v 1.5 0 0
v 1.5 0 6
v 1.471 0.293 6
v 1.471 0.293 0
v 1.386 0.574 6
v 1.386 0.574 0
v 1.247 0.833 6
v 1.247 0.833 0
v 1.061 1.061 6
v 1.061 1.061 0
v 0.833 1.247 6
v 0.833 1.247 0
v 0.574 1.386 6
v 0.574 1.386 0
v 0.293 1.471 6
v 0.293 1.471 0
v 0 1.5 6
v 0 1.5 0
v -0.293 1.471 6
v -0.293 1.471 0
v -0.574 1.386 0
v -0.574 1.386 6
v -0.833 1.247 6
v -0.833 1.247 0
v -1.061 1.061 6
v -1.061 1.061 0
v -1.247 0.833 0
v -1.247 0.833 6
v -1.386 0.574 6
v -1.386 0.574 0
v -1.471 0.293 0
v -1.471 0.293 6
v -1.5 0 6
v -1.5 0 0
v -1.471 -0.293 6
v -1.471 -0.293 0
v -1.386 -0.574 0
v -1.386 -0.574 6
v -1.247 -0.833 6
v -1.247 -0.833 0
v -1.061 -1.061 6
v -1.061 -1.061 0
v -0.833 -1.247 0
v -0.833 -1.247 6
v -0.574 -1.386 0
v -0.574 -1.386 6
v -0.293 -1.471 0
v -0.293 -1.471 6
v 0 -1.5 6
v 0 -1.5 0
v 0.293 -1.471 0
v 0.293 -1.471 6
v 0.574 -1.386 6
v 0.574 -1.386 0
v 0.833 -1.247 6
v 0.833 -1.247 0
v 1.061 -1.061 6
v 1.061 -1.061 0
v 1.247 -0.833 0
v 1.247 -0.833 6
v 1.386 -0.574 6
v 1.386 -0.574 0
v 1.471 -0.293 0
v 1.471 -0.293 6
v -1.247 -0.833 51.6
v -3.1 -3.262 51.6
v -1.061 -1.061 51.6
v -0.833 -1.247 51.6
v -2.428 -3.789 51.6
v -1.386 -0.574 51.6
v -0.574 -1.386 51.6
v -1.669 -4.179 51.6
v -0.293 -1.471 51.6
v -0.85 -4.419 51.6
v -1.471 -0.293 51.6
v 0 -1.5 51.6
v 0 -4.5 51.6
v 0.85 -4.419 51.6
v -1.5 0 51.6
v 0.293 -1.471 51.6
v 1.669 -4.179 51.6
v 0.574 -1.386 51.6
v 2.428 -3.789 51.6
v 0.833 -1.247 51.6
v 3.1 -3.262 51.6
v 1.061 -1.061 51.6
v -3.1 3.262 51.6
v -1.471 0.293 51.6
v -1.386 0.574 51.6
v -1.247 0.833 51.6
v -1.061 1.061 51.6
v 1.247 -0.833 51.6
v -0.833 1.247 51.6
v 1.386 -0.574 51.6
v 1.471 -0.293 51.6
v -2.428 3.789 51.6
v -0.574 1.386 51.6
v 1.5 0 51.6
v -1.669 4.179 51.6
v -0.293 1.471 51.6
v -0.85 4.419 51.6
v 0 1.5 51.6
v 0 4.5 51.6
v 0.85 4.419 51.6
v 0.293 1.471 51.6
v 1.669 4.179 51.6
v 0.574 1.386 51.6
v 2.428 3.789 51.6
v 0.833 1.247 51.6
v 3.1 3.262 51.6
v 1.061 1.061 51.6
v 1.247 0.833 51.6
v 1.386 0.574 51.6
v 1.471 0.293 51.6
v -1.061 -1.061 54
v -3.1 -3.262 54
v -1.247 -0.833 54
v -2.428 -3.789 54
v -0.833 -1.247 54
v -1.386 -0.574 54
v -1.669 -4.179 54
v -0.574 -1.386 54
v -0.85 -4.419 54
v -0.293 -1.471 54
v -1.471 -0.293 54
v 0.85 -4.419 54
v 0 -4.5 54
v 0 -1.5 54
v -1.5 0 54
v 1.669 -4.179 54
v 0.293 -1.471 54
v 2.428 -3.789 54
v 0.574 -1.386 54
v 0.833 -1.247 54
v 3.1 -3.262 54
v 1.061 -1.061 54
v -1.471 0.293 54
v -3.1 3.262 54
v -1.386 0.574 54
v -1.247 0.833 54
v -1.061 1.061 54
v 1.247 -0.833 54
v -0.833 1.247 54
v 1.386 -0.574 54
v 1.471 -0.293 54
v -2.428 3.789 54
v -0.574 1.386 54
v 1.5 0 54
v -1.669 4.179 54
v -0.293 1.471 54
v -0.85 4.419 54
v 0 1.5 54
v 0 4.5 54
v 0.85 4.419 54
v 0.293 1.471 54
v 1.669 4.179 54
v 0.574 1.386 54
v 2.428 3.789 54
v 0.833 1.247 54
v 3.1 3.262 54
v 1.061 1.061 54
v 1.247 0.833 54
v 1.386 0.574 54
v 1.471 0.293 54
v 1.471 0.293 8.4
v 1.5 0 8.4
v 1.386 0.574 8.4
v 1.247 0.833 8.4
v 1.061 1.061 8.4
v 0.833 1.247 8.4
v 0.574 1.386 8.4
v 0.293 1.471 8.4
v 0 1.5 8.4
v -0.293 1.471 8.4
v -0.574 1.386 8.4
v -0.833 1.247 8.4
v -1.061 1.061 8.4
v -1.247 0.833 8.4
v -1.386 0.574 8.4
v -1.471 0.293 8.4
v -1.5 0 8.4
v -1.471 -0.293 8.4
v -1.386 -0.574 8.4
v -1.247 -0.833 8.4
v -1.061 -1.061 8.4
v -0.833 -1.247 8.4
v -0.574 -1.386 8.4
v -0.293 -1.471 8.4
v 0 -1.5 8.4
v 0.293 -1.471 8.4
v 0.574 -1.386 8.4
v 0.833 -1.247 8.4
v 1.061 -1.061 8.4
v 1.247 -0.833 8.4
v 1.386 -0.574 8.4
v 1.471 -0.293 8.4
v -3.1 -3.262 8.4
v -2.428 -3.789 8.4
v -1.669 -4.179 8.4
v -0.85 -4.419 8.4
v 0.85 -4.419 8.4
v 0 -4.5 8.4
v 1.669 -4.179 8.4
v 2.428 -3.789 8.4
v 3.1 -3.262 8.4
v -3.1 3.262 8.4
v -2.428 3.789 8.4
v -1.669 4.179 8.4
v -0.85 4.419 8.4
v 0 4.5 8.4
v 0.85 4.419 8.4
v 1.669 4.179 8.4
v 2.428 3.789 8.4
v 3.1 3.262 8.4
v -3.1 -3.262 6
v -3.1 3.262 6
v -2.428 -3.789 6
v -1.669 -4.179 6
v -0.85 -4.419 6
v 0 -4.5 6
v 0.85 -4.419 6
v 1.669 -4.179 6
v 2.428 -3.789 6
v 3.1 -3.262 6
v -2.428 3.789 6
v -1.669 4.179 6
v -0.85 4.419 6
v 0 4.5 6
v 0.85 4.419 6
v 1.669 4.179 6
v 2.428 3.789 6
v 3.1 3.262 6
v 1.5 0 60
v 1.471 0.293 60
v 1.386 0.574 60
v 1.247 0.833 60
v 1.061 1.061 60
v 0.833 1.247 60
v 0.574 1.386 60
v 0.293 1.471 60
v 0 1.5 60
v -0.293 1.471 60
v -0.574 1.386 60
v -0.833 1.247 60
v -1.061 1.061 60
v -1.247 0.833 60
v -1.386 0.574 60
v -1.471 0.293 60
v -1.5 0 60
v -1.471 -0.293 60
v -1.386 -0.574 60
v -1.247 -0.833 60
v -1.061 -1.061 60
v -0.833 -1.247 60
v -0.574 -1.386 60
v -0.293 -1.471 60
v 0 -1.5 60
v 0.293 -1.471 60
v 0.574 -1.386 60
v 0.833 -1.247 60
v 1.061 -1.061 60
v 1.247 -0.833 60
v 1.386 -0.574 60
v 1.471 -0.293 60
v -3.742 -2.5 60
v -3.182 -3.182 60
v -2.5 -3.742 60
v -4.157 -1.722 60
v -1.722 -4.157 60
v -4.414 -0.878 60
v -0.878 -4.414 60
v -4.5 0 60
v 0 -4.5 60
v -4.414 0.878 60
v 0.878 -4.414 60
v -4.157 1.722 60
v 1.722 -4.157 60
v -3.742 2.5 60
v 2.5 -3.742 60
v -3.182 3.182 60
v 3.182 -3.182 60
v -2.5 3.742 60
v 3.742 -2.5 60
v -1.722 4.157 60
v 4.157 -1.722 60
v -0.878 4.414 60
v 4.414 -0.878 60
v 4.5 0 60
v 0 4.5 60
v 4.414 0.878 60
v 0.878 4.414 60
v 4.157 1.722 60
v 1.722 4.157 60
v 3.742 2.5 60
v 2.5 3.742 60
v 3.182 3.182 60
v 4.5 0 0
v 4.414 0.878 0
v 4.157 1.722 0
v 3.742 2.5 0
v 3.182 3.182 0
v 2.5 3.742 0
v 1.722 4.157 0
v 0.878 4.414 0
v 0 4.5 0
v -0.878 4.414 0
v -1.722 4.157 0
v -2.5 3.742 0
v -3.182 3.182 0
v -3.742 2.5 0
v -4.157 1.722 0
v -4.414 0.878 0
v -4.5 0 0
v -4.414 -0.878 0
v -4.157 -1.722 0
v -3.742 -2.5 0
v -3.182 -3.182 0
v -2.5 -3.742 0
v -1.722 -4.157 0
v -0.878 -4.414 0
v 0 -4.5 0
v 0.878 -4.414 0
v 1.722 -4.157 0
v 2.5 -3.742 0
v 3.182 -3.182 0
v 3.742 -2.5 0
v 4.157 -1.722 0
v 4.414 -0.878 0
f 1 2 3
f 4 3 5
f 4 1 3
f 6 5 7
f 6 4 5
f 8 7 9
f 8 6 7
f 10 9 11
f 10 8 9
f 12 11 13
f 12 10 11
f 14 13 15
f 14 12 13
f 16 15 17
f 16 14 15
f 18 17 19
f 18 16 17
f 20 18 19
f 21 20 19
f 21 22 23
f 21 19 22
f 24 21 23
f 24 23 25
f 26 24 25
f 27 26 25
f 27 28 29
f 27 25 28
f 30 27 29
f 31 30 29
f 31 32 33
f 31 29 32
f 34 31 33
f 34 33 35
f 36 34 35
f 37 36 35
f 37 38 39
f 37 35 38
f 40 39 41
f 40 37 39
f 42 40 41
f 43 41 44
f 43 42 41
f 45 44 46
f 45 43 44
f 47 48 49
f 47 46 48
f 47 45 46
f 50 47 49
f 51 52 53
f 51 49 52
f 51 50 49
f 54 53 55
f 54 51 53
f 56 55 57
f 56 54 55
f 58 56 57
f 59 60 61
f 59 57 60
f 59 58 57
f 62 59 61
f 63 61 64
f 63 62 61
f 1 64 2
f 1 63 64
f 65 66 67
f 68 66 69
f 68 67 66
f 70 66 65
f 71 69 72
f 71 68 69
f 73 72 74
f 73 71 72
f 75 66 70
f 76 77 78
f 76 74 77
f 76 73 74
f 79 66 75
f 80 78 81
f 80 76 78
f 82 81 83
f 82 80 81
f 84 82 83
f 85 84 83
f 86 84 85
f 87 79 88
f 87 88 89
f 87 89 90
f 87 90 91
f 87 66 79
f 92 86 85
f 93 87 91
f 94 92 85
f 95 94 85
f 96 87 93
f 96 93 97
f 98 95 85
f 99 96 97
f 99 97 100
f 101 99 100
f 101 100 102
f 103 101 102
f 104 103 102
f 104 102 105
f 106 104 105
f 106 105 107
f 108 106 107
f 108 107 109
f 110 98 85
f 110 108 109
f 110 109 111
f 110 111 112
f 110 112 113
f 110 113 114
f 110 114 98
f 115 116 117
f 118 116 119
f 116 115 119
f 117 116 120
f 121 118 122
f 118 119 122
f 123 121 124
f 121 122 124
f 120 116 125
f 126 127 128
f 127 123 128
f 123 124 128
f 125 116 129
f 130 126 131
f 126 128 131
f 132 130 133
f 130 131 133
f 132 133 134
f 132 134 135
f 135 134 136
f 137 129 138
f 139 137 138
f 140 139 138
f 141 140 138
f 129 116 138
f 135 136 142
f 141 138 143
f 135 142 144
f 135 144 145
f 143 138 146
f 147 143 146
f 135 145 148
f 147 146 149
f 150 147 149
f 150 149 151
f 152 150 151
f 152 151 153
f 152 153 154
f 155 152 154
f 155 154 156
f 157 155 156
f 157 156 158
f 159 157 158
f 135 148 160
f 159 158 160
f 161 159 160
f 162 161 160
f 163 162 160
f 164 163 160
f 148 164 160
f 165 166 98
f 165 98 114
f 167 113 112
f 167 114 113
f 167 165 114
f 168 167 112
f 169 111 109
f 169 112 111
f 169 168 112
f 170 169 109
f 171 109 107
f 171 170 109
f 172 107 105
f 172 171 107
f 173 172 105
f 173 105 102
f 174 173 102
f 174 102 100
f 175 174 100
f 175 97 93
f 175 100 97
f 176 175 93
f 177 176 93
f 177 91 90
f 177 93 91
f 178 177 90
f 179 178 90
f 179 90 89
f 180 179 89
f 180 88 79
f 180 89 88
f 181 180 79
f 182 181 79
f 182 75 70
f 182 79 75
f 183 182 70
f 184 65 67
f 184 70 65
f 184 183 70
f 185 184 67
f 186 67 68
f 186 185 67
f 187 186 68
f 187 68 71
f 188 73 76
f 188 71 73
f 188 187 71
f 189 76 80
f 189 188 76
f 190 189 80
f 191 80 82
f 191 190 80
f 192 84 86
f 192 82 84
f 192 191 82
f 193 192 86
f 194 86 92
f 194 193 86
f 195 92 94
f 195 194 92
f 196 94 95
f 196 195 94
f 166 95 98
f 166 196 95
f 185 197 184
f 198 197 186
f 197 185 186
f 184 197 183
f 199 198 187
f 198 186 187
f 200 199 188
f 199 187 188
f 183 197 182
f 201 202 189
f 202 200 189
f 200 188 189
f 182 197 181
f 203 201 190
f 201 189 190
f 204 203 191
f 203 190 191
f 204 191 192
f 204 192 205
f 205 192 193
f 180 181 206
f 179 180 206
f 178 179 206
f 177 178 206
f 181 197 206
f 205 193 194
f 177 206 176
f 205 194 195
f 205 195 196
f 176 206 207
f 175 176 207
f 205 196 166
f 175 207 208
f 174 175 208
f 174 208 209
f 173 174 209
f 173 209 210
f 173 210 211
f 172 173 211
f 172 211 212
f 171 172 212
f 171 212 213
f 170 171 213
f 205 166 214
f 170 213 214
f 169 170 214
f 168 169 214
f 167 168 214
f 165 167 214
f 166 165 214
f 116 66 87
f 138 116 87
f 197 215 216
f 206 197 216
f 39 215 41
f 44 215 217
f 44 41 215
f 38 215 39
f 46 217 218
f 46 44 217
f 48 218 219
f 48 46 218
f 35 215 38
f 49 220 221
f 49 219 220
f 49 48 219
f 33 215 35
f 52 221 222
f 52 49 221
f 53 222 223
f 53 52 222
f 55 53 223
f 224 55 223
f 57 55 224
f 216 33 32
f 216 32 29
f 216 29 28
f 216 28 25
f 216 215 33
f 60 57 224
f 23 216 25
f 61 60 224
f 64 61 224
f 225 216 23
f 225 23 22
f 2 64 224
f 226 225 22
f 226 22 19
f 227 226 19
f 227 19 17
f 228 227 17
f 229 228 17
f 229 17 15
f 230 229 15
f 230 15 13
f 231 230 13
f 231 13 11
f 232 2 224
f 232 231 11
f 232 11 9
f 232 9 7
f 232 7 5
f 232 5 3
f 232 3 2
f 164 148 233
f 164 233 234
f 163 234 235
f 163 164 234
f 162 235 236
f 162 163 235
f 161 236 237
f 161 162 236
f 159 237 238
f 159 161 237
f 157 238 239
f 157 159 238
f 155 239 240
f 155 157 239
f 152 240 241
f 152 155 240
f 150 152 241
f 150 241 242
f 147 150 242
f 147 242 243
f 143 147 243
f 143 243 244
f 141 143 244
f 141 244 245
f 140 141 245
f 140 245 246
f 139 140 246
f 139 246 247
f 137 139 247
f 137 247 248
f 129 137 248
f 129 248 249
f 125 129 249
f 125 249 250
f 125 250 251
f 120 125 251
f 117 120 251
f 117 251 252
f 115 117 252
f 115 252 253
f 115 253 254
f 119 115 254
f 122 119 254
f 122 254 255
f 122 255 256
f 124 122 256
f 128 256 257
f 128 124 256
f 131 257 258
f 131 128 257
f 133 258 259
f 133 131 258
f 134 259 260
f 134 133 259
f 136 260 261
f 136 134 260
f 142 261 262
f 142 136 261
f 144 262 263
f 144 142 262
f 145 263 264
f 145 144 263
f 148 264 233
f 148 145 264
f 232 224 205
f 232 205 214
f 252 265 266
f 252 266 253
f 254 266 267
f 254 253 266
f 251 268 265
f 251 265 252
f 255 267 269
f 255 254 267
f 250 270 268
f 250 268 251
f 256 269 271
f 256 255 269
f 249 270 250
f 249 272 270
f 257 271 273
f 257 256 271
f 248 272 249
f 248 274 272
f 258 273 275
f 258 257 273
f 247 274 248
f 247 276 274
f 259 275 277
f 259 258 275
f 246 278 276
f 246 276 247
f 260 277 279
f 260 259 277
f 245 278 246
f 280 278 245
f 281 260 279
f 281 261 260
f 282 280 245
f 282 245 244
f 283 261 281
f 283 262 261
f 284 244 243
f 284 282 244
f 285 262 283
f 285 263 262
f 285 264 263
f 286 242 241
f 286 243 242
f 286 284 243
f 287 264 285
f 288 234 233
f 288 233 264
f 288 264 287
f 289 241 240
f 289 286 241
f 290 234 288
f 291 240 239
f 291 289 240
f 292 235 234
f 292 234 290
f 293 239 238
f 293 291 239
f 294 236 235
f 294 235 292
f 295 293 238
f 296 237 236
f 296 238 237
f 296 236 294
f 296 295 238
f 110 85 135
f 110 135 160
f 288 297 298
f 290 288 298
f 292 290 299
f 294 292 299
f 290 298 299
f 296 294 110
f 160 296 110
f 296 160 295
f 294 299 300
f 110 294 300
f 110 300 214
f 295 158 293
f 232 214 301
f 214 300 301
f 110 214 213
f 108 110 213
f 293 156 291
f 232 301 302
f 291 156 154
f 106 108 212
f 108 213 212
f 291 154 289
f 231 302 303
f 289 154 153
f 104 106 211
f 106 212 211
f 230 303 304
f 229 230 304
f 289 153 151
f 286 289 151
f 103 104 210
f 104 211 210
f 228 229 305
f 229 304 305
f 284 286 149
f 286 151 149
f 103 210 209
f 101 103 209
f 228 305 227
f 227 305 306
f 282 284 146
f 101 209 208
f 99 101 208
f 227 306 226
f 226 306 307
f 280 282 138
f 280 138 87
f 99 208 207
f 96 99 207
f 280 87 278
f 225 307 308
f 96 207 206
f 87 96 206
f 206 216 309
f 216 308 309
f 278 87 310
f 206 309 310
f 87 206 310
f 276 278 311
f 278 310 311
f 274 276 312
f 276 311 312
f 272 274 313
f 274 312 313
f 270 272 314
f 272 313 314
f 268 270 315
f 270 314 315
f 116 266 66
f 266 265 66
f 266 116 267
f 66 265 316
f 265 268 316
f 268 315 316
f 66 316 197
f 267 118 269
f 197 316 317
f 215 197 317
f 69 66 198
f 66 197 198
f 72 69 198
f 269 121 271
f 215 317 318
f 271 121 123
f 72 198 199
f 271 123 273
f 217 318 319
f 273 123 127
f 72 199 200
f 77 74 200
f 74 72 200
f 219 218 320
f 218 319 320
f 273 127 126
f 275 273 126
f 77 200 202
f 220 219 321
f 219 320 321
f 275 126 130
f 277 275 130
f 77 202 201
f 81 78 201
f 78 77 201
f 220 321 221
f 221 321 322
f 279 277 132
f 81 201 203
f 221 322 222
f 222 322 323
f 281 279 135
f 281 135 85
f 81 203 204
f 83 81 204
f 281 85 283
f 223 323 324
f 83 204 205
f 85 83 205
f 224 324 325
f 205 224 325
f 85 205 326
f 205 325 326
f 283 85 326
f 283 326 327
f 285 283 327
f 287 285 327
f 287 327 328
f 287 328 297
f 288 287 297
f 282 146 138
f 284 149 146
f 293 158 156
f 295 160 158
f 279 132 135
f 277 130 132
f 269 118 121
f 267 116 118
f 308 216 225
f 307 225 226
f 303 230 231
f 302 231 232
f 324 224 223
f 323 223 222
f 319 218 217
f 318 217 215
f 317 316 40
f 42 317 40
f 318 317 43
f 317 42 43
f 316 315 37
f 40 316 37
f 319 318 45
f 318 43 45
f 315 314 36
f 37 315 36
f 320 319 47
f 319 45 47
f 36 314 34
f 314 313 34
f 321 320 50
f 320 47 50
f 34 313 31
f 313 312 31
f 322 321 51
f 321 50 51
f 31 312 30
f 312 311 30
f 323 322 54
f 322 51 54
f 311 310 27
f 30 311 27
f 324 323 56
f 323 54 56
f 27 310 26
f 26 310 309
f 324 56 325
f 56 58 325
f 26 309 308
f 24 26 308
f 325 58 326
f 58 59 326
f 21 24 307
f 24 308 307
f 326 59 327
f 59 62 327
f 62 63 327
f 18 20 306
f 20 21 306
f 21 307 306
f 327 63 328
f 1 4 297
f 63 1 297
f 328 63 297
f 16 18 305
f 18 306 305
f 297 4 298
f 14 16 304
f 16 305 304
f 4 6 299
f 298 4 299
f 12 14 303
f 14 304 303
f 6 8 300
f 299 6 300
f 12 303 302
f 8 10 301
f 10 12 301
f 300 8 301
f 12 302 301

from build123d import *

# Parameters (mm, degrees)
BOX011_W          = 6.2
BOX011_H          = 10
BOX011_DEPTH      = 2.4
BOX010_W          = 6.2
BOX010_H          = 10
BOX010_DEPTH      = 2.4
CYLINDER007_R     = 1.5
CYLINDER007_DEPTH = 60
CYLINDER006_R     = 4.5
CYLINDER006_DEPTH = 60


with BuildPart() as nut2:
    # Box011 → Box011 (new body)
    with BuildSketch(Plane(origin=(-3.1, -5, 51.6), x_dir=(1, 0, 0), z_dir=(0, 0, 1))):
        with Locations((3.1, 5)):
            Rectangle(BOX011_W, BOX011_H)
    extrude(amount=BOX011_DEPTH)


with BuildPart() as nut1:
    # Box010 → Box010 (new body)
    with BuildSketch(Plane(origin=(-3.1, -5, 6), x_dir=(1, 0, 0), z_dir=(0, 0, 1))):
        with Locations((3.1, 5)):
            Rectangle(BOX010_W, BOX010_H)
    extrude(amount=BOX010_DEPTH)


with BuildPart() as columnhole:
    # Cylinder007 → Cylinder007 (new body)
    with BuildSketch(Plane.XY):
        Circle(CYLINDER007_R)
    extrude(amount=CYLINDER007_DEPTH)


with BuildPart() as column:
    # Cylinder006 → Cylinder006 (new body)
    with BuildSketch(Plane.XY):
        Circle(CYLINDER006_R)
    extrude(amount=CYLINDER006_DEPTH)

    # Cut010: cut ColumnHole
    add(columnhole.part, mode=Mode.SUBTRACT)

    # Cut011: cut Nut1
    add(nut1.part, mode=Mode.SUBTRACT)

    # Cut012: cut Nut2
    add(nut2.part, mode=Mode.SUBTRACT)


solid = column.part
